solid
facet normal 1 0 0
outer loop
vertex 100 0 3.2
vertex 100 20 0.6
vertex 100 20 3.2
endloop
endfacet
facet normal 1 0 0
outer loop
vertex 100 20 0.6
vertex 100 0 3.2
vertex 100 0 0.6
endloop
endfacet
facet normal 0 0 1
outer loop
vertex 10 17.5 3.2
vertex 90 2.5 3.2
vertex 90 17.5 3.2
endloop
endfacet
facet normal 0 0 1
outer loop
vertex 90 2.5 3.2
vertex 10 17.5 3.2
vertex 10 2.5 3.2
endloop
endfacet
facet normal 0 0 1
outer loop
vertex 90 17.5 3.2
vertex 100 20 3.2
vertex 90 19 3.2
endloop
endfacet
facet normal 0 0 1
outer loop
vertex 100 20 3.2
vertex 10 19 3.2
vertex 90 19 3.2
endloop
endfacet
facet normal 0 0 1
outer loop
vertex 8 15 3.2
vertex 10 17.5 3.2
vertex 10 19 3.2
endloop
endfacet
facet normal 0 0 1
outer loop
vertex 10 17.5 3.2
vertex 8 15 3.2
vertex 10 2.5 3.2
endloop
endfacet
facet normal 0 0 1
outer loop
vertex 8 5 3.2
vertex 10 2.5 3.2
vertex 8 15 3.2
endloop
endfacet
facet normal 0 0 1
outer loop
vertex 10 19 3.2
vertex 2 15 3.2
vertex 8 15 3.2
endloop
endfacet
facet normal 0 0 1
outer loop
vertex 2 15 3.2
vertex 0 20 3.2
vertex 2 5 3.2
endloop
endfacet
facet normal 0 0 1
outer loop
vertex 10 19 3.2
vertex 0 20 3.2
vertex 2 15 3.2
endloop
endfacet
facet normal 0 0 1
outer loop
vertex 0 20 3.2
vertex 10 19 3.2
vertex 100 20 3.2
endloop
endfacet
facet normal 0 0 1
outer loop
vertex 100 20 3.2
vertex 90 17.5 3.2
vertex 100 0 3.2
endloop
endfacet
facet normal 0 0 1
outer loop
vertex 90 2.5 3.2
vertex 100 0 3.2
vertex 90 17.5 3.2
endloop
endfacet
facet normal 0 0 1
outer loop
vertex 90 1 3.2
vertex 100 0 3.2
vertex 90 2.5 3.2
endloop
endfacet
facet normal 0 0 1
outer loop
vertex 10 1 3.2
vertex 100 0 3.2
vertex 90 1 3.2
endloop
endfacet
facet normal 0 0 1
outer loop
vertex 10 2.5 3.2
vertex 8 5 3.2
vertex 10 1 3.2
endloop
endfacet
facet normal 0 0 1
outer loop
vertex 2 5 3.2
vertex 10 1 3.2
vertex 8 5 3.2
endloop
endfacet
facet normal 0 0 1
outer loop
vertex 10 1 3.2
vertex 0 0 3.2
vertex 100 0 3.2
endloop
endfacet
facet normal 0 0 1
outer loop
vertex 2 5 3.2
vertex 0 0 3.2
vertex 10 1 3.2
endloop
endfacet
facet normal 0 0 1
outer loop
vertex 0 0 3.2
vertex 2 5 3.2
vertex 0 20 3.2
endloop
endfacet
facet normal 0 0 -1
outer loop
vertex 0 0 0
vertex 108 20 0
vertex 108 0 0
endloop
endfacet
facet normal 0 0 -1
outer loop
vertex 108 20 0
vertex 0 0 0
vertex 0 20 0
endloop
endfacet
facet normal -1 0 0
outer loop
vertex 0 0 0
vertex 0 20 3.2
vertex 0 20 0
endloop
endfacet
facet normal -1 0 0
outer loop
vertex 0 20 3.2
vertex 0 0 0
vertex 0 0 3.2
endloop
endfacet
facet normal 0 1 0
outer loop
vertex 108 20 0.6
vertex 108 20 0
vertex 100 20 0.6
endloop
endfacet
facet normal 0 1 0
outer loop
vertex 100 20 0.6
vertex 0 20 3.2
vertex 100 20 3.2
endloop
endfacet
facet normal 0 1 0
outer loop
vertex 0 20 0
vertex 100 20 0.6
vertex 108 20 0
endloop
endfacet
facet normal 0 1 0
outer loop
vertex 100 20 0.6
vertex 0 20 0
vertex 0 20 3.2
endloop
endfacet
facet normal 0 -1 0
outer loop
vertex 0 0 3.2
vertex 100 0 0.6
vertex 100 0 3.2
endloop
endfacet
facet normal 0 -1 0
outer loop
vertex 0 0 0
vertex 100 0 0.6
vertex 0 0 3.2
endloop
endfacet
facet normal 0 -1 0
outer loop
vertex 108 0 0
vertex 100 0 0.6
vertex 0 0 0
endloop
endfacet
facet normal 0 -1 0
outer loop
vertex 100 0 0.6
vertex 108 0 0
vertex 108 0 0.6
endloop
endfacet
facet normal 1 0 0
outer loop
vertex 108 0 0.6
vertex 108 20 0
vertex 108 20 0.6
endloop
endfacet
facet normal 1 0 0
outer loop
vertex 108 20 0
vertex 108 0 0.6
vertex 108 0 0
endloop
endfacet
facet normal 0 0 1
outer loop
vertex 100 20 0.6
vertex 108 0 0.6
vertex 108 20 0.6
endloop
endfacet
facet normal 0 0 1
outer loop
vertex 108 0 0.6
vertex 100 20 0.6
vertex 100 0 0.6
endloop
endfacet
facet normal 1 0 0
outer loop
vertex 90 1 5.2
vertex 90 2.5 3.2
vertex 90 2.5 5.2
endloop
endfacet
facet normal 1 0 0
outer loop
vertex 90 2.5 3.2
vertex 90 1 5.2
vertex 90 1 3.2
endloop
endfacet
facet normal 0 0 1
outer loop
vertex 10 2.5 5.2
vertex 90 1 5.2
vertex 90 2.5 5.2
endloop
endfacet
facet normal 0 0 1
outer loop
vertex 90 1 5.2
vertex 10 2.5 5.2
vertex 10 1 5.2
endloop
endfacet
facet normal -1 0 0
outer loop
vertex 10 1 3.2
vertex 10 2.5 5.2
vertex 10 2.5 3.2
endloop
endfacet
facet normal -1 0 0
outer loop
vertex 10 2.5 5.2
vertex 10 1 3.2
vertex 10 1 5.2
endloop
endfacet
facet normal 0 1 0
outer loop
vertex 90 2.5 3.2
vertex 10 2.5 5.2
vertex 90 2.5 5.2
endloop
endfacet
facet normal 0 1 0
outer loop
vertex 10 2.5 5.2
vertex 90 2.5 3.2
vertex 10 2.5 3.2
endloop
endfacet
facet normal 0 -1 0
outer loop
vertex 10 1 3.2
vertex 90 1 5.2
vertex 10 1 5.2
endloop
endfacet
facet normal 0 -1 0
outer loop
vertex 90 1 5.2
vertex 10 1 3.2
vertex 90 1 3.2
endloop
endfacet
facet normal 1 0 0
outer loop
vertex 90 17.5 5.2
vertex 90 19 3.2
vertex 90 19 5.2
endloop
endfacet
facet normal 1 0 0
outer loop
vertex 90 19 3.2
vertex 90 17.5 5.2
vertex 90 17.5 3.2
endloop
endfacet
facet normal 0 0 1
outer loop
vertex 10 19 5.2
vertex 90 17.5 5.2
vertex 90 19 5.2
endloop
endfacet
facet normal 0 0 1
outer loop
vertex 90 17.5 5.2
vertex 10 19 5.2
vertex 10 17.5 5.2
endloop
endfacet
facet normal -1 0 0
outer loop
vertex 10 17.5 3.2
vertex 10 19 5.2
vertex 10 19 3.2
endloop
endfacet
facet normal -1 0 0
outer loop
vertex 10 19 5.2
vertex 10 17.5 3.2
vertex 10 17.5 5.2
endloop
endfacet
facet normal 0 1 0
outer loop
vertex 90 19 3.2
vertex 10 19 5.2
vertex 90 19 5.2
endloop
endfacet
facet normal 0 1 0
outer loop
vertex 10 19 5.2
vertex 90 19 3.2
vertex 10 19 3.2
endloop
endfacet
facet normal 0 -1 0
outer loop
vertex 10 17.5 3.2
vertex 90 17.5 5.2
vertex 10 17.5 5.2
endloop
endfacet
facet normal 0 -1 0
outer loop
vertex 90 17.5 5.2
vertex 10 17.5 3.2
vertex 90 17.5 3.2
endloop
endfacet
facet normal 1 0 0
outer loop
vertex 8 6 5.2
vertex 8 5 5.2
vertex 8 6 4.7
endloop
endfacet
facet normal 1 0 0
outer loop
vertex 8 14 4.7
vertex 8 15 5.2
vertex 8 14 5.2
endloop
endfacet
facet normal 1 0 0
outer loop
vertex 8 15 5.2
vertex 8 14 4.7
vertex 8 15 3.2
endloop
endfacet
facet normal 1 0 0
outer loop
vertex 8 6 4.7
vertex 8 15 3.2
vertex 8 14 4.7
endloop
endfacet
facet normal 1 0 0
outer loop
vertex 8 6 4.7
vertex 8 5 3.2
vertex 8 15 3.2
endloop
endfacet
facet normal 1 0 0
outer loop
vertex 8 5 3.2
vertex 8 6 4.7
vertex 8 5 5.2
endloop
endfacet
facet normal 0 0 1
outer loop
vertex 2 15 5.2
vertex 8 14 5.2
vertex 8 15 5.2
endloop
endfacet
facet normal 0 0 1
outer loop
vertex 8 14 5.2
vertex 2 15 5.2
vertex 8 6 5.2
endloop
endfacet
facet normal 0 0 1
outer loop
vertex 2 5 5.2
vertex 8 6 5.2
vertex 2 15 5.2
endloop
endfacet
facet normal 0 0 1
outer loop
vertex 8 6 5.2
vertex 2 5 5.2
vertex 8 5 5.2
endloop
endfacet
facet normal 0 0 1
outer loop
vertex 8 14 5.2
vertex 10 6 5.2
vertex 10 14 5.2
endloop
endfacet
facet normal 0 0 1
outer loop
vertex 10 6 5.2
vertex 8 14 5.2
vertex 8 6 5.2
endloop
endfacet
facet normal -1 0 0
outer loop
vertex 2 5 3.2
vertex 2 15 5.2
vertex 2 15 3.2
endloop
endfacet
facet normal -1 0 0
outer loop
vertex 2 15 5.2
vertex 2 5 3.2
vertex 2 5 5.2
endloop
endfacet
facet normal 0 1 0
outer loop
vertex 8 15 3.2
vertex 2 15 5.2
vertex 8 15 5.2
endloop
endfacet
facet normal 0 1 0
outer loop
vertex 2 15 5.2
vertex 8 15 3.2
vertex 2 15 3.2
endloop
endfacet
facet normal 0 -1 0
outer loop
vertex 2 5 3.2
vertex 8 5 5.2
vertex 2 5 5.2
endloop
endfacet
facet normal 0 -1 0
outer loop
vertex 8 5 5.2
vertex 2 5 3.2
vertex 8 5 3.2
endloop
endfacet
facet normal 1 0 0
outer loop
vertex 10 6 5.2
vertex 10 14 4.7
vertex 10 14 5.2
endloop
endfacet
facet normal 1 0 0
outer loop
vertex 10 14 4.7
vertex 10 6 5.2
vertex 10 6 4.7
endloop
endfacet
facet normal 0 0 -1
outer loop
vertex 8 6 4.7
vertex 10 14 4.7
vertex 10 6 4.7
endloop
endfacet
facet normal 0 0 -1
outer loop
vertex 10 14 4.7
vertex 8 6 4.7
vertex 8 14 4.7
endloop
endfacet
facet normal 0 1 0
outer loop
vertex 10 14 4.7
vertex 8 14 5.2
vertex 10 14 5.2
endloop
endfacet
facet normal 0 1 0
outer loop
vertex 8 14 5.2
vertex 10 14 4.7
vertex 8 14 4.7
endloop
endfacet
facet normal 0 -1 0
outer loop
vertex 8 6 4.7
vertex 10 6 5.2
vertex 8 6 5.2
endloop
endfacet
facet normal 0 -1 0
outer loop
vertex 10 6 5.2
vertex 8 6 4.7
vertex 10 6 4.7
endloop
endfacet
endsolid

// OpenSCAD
// Bag clip with living hinge - PETG, 0.4mm nozzle, no supports
// One piece, printed open flat. Lower arm + upper arm meet at hinge mid-plane.
// Fold map (180 about pivot): F(x) = 216 - x, F(z) = 10.4 - z.

part = "arm_lower"; // [arm_lower, arm_upper, assembly]
cadverify_only = "";

Lbody = 100;
Wbody = 20;
Tbody = 3.2;
Hhalf = 8;
Thinge = 0.6;
Bgap = 2.0;
Xpiv = 108;
Zpiv = 5.2;

module instance(name, part, unit = 1) {
    echo(cadverify_instance = [name, part, unit]);
    if (cadverify_only == "" || cadverify_only == name) children();
}

module arm_lower() {
    cube([Lbody, Wbody, Tbody], false);
    translate([Lbody-0.1, 0, 0])
        cube([Hhalf+0.1, Wbody, Thinge], false);
    translate([10, 1, Tbody-0.1])
        cube([80, 1.5, Bgap+0.1], false);
    translate([10, 17.5, Tbody-0.1])
        cube([80, 1.5, Bgap+0.1], false);
    translate([2, 5, Tbody-0.1])
        cube([6, 10, Bgap+0.1], false);
    translate([7.9, 6, 4.7])
        cube([2.1, 8, 0.5], false);
}

module arm_upper() {
    cube([Hhalf+0.1, Wbody, Thinge], false);
    translate([Hhalf-0.1, 0, 0])
        cube([Lbody+0.1, Wbody, Tbody], false);
    translate([100, 5, Tbody-0.1])
        cube([6, 10, Bgap+0.1], false);
    translate([97.9, 6, 4.7])
        cube([2.5, 8, 0.5], false);
    translate([107.9, 6, 0])
        cube([8.1, 8, Tbody], false);
}

if (part == "arm_lower") {
    echo(cadverify_spec = [
        ["bounds", [[0, 0, 0], [108, 20, 5.2]]],
        ["bodies", 1],
        ["through_holes", 0],
        ["support_faces", [["bed", "-z", 1500]]],
        ["overhangs_allowed", [["latch lip", [[7.5, 5.5, 4.5], [10.5, 14.5, 5.5]]]]],
        ["copies", 1],
        ["details", [
            ["arm", "material", [[20, 6, 1.0], [80, 14, 2.2]], 1],
            ["arm_wall", "thickness", [50, 10, 10], [0, 0, -1], 3.2],
            ["hinge", "thickness", [104, 10, 5], [0, 0, -1], 0.6],
            ["rib", "material", [[20, 1.2, 3.5], [80, 2.3, 5.0]], 1],
            ["latch_tower", "material", [[3, 6, 3.5], [7, 14, 5.0]], 1],
            ["latch_lip", "material", [[8.2, 7, 4.8], [9.7, 13, 5.1]], 1],
            ["bag_slot", "void", [[20, 3, 3.5], [80, 17, 5.0]], 1]
        ]]
    ]);
    arm_lower();
} else if (part == "arm_upper") {
    echo(cadverify_spec = [
        ["bounds", [[0, 0, 0], [116, 20, 5.2]]],
        ["bodies", 1],
        ["through_holes", 0],
        ["support_faces", [["bed", "-z", 1500]]],
        ["overhangs_allowed", [["latch lip", [[97.5, 5.5, 4.5], [100.8, 14.5, 5.5]]]]],
        ["copies", 1],
        ["details", [
            ["arm", "material", [[15, 6, 1.0], [80, 14, 2.2]], 0.99],
            ["arm_wall", "thickness", [50, 10, 10], [0, 0, -1], 3.2],
            ["hinge", "thickness", [4, 10, 5], [0, 0, -1], 0.6],
            ["latch_tower", "material", [[100.5, 6, 3.5], [105.5, 14, 5.0]], 1],
            ["latch_lip", "material", [[98.2, 7, 4.8], [100.1, 13, 5.1]], 1],
            ["thumb_tab", "material", [[108.5, 7, 1.0], [115, 13, 2.2]], 1],
            ["field", "void", [[15, 3, 3.5], [80, 17, 5.0]], 1]
        ]]
    ]);
    arm_upper();
} else if (part == "assembly") {
    echo(cadverify_spec = [
        ["bounds", [[0, 0, 0], [224, 20, 5.2]]],
        ["support_faces", [["bed", "-z", 3000]]],
        ["motions", [
            ["close", ["upper"], "rotate", [108, 10, 5.2], [0, -1, 0], [0, 180],
                ["stops", [180]]
            ]
        ]],
        ["assembly_order", [
            [["lower"], [0, 0, 0]],
            [["upper"], [0, 0, -1]]
        ]]
    ]);
    instance("lower", "arm_lower") arm_lower();
    instance("upper", "arm_upper") translate([108, 0, 0]) arm_upper();
}
